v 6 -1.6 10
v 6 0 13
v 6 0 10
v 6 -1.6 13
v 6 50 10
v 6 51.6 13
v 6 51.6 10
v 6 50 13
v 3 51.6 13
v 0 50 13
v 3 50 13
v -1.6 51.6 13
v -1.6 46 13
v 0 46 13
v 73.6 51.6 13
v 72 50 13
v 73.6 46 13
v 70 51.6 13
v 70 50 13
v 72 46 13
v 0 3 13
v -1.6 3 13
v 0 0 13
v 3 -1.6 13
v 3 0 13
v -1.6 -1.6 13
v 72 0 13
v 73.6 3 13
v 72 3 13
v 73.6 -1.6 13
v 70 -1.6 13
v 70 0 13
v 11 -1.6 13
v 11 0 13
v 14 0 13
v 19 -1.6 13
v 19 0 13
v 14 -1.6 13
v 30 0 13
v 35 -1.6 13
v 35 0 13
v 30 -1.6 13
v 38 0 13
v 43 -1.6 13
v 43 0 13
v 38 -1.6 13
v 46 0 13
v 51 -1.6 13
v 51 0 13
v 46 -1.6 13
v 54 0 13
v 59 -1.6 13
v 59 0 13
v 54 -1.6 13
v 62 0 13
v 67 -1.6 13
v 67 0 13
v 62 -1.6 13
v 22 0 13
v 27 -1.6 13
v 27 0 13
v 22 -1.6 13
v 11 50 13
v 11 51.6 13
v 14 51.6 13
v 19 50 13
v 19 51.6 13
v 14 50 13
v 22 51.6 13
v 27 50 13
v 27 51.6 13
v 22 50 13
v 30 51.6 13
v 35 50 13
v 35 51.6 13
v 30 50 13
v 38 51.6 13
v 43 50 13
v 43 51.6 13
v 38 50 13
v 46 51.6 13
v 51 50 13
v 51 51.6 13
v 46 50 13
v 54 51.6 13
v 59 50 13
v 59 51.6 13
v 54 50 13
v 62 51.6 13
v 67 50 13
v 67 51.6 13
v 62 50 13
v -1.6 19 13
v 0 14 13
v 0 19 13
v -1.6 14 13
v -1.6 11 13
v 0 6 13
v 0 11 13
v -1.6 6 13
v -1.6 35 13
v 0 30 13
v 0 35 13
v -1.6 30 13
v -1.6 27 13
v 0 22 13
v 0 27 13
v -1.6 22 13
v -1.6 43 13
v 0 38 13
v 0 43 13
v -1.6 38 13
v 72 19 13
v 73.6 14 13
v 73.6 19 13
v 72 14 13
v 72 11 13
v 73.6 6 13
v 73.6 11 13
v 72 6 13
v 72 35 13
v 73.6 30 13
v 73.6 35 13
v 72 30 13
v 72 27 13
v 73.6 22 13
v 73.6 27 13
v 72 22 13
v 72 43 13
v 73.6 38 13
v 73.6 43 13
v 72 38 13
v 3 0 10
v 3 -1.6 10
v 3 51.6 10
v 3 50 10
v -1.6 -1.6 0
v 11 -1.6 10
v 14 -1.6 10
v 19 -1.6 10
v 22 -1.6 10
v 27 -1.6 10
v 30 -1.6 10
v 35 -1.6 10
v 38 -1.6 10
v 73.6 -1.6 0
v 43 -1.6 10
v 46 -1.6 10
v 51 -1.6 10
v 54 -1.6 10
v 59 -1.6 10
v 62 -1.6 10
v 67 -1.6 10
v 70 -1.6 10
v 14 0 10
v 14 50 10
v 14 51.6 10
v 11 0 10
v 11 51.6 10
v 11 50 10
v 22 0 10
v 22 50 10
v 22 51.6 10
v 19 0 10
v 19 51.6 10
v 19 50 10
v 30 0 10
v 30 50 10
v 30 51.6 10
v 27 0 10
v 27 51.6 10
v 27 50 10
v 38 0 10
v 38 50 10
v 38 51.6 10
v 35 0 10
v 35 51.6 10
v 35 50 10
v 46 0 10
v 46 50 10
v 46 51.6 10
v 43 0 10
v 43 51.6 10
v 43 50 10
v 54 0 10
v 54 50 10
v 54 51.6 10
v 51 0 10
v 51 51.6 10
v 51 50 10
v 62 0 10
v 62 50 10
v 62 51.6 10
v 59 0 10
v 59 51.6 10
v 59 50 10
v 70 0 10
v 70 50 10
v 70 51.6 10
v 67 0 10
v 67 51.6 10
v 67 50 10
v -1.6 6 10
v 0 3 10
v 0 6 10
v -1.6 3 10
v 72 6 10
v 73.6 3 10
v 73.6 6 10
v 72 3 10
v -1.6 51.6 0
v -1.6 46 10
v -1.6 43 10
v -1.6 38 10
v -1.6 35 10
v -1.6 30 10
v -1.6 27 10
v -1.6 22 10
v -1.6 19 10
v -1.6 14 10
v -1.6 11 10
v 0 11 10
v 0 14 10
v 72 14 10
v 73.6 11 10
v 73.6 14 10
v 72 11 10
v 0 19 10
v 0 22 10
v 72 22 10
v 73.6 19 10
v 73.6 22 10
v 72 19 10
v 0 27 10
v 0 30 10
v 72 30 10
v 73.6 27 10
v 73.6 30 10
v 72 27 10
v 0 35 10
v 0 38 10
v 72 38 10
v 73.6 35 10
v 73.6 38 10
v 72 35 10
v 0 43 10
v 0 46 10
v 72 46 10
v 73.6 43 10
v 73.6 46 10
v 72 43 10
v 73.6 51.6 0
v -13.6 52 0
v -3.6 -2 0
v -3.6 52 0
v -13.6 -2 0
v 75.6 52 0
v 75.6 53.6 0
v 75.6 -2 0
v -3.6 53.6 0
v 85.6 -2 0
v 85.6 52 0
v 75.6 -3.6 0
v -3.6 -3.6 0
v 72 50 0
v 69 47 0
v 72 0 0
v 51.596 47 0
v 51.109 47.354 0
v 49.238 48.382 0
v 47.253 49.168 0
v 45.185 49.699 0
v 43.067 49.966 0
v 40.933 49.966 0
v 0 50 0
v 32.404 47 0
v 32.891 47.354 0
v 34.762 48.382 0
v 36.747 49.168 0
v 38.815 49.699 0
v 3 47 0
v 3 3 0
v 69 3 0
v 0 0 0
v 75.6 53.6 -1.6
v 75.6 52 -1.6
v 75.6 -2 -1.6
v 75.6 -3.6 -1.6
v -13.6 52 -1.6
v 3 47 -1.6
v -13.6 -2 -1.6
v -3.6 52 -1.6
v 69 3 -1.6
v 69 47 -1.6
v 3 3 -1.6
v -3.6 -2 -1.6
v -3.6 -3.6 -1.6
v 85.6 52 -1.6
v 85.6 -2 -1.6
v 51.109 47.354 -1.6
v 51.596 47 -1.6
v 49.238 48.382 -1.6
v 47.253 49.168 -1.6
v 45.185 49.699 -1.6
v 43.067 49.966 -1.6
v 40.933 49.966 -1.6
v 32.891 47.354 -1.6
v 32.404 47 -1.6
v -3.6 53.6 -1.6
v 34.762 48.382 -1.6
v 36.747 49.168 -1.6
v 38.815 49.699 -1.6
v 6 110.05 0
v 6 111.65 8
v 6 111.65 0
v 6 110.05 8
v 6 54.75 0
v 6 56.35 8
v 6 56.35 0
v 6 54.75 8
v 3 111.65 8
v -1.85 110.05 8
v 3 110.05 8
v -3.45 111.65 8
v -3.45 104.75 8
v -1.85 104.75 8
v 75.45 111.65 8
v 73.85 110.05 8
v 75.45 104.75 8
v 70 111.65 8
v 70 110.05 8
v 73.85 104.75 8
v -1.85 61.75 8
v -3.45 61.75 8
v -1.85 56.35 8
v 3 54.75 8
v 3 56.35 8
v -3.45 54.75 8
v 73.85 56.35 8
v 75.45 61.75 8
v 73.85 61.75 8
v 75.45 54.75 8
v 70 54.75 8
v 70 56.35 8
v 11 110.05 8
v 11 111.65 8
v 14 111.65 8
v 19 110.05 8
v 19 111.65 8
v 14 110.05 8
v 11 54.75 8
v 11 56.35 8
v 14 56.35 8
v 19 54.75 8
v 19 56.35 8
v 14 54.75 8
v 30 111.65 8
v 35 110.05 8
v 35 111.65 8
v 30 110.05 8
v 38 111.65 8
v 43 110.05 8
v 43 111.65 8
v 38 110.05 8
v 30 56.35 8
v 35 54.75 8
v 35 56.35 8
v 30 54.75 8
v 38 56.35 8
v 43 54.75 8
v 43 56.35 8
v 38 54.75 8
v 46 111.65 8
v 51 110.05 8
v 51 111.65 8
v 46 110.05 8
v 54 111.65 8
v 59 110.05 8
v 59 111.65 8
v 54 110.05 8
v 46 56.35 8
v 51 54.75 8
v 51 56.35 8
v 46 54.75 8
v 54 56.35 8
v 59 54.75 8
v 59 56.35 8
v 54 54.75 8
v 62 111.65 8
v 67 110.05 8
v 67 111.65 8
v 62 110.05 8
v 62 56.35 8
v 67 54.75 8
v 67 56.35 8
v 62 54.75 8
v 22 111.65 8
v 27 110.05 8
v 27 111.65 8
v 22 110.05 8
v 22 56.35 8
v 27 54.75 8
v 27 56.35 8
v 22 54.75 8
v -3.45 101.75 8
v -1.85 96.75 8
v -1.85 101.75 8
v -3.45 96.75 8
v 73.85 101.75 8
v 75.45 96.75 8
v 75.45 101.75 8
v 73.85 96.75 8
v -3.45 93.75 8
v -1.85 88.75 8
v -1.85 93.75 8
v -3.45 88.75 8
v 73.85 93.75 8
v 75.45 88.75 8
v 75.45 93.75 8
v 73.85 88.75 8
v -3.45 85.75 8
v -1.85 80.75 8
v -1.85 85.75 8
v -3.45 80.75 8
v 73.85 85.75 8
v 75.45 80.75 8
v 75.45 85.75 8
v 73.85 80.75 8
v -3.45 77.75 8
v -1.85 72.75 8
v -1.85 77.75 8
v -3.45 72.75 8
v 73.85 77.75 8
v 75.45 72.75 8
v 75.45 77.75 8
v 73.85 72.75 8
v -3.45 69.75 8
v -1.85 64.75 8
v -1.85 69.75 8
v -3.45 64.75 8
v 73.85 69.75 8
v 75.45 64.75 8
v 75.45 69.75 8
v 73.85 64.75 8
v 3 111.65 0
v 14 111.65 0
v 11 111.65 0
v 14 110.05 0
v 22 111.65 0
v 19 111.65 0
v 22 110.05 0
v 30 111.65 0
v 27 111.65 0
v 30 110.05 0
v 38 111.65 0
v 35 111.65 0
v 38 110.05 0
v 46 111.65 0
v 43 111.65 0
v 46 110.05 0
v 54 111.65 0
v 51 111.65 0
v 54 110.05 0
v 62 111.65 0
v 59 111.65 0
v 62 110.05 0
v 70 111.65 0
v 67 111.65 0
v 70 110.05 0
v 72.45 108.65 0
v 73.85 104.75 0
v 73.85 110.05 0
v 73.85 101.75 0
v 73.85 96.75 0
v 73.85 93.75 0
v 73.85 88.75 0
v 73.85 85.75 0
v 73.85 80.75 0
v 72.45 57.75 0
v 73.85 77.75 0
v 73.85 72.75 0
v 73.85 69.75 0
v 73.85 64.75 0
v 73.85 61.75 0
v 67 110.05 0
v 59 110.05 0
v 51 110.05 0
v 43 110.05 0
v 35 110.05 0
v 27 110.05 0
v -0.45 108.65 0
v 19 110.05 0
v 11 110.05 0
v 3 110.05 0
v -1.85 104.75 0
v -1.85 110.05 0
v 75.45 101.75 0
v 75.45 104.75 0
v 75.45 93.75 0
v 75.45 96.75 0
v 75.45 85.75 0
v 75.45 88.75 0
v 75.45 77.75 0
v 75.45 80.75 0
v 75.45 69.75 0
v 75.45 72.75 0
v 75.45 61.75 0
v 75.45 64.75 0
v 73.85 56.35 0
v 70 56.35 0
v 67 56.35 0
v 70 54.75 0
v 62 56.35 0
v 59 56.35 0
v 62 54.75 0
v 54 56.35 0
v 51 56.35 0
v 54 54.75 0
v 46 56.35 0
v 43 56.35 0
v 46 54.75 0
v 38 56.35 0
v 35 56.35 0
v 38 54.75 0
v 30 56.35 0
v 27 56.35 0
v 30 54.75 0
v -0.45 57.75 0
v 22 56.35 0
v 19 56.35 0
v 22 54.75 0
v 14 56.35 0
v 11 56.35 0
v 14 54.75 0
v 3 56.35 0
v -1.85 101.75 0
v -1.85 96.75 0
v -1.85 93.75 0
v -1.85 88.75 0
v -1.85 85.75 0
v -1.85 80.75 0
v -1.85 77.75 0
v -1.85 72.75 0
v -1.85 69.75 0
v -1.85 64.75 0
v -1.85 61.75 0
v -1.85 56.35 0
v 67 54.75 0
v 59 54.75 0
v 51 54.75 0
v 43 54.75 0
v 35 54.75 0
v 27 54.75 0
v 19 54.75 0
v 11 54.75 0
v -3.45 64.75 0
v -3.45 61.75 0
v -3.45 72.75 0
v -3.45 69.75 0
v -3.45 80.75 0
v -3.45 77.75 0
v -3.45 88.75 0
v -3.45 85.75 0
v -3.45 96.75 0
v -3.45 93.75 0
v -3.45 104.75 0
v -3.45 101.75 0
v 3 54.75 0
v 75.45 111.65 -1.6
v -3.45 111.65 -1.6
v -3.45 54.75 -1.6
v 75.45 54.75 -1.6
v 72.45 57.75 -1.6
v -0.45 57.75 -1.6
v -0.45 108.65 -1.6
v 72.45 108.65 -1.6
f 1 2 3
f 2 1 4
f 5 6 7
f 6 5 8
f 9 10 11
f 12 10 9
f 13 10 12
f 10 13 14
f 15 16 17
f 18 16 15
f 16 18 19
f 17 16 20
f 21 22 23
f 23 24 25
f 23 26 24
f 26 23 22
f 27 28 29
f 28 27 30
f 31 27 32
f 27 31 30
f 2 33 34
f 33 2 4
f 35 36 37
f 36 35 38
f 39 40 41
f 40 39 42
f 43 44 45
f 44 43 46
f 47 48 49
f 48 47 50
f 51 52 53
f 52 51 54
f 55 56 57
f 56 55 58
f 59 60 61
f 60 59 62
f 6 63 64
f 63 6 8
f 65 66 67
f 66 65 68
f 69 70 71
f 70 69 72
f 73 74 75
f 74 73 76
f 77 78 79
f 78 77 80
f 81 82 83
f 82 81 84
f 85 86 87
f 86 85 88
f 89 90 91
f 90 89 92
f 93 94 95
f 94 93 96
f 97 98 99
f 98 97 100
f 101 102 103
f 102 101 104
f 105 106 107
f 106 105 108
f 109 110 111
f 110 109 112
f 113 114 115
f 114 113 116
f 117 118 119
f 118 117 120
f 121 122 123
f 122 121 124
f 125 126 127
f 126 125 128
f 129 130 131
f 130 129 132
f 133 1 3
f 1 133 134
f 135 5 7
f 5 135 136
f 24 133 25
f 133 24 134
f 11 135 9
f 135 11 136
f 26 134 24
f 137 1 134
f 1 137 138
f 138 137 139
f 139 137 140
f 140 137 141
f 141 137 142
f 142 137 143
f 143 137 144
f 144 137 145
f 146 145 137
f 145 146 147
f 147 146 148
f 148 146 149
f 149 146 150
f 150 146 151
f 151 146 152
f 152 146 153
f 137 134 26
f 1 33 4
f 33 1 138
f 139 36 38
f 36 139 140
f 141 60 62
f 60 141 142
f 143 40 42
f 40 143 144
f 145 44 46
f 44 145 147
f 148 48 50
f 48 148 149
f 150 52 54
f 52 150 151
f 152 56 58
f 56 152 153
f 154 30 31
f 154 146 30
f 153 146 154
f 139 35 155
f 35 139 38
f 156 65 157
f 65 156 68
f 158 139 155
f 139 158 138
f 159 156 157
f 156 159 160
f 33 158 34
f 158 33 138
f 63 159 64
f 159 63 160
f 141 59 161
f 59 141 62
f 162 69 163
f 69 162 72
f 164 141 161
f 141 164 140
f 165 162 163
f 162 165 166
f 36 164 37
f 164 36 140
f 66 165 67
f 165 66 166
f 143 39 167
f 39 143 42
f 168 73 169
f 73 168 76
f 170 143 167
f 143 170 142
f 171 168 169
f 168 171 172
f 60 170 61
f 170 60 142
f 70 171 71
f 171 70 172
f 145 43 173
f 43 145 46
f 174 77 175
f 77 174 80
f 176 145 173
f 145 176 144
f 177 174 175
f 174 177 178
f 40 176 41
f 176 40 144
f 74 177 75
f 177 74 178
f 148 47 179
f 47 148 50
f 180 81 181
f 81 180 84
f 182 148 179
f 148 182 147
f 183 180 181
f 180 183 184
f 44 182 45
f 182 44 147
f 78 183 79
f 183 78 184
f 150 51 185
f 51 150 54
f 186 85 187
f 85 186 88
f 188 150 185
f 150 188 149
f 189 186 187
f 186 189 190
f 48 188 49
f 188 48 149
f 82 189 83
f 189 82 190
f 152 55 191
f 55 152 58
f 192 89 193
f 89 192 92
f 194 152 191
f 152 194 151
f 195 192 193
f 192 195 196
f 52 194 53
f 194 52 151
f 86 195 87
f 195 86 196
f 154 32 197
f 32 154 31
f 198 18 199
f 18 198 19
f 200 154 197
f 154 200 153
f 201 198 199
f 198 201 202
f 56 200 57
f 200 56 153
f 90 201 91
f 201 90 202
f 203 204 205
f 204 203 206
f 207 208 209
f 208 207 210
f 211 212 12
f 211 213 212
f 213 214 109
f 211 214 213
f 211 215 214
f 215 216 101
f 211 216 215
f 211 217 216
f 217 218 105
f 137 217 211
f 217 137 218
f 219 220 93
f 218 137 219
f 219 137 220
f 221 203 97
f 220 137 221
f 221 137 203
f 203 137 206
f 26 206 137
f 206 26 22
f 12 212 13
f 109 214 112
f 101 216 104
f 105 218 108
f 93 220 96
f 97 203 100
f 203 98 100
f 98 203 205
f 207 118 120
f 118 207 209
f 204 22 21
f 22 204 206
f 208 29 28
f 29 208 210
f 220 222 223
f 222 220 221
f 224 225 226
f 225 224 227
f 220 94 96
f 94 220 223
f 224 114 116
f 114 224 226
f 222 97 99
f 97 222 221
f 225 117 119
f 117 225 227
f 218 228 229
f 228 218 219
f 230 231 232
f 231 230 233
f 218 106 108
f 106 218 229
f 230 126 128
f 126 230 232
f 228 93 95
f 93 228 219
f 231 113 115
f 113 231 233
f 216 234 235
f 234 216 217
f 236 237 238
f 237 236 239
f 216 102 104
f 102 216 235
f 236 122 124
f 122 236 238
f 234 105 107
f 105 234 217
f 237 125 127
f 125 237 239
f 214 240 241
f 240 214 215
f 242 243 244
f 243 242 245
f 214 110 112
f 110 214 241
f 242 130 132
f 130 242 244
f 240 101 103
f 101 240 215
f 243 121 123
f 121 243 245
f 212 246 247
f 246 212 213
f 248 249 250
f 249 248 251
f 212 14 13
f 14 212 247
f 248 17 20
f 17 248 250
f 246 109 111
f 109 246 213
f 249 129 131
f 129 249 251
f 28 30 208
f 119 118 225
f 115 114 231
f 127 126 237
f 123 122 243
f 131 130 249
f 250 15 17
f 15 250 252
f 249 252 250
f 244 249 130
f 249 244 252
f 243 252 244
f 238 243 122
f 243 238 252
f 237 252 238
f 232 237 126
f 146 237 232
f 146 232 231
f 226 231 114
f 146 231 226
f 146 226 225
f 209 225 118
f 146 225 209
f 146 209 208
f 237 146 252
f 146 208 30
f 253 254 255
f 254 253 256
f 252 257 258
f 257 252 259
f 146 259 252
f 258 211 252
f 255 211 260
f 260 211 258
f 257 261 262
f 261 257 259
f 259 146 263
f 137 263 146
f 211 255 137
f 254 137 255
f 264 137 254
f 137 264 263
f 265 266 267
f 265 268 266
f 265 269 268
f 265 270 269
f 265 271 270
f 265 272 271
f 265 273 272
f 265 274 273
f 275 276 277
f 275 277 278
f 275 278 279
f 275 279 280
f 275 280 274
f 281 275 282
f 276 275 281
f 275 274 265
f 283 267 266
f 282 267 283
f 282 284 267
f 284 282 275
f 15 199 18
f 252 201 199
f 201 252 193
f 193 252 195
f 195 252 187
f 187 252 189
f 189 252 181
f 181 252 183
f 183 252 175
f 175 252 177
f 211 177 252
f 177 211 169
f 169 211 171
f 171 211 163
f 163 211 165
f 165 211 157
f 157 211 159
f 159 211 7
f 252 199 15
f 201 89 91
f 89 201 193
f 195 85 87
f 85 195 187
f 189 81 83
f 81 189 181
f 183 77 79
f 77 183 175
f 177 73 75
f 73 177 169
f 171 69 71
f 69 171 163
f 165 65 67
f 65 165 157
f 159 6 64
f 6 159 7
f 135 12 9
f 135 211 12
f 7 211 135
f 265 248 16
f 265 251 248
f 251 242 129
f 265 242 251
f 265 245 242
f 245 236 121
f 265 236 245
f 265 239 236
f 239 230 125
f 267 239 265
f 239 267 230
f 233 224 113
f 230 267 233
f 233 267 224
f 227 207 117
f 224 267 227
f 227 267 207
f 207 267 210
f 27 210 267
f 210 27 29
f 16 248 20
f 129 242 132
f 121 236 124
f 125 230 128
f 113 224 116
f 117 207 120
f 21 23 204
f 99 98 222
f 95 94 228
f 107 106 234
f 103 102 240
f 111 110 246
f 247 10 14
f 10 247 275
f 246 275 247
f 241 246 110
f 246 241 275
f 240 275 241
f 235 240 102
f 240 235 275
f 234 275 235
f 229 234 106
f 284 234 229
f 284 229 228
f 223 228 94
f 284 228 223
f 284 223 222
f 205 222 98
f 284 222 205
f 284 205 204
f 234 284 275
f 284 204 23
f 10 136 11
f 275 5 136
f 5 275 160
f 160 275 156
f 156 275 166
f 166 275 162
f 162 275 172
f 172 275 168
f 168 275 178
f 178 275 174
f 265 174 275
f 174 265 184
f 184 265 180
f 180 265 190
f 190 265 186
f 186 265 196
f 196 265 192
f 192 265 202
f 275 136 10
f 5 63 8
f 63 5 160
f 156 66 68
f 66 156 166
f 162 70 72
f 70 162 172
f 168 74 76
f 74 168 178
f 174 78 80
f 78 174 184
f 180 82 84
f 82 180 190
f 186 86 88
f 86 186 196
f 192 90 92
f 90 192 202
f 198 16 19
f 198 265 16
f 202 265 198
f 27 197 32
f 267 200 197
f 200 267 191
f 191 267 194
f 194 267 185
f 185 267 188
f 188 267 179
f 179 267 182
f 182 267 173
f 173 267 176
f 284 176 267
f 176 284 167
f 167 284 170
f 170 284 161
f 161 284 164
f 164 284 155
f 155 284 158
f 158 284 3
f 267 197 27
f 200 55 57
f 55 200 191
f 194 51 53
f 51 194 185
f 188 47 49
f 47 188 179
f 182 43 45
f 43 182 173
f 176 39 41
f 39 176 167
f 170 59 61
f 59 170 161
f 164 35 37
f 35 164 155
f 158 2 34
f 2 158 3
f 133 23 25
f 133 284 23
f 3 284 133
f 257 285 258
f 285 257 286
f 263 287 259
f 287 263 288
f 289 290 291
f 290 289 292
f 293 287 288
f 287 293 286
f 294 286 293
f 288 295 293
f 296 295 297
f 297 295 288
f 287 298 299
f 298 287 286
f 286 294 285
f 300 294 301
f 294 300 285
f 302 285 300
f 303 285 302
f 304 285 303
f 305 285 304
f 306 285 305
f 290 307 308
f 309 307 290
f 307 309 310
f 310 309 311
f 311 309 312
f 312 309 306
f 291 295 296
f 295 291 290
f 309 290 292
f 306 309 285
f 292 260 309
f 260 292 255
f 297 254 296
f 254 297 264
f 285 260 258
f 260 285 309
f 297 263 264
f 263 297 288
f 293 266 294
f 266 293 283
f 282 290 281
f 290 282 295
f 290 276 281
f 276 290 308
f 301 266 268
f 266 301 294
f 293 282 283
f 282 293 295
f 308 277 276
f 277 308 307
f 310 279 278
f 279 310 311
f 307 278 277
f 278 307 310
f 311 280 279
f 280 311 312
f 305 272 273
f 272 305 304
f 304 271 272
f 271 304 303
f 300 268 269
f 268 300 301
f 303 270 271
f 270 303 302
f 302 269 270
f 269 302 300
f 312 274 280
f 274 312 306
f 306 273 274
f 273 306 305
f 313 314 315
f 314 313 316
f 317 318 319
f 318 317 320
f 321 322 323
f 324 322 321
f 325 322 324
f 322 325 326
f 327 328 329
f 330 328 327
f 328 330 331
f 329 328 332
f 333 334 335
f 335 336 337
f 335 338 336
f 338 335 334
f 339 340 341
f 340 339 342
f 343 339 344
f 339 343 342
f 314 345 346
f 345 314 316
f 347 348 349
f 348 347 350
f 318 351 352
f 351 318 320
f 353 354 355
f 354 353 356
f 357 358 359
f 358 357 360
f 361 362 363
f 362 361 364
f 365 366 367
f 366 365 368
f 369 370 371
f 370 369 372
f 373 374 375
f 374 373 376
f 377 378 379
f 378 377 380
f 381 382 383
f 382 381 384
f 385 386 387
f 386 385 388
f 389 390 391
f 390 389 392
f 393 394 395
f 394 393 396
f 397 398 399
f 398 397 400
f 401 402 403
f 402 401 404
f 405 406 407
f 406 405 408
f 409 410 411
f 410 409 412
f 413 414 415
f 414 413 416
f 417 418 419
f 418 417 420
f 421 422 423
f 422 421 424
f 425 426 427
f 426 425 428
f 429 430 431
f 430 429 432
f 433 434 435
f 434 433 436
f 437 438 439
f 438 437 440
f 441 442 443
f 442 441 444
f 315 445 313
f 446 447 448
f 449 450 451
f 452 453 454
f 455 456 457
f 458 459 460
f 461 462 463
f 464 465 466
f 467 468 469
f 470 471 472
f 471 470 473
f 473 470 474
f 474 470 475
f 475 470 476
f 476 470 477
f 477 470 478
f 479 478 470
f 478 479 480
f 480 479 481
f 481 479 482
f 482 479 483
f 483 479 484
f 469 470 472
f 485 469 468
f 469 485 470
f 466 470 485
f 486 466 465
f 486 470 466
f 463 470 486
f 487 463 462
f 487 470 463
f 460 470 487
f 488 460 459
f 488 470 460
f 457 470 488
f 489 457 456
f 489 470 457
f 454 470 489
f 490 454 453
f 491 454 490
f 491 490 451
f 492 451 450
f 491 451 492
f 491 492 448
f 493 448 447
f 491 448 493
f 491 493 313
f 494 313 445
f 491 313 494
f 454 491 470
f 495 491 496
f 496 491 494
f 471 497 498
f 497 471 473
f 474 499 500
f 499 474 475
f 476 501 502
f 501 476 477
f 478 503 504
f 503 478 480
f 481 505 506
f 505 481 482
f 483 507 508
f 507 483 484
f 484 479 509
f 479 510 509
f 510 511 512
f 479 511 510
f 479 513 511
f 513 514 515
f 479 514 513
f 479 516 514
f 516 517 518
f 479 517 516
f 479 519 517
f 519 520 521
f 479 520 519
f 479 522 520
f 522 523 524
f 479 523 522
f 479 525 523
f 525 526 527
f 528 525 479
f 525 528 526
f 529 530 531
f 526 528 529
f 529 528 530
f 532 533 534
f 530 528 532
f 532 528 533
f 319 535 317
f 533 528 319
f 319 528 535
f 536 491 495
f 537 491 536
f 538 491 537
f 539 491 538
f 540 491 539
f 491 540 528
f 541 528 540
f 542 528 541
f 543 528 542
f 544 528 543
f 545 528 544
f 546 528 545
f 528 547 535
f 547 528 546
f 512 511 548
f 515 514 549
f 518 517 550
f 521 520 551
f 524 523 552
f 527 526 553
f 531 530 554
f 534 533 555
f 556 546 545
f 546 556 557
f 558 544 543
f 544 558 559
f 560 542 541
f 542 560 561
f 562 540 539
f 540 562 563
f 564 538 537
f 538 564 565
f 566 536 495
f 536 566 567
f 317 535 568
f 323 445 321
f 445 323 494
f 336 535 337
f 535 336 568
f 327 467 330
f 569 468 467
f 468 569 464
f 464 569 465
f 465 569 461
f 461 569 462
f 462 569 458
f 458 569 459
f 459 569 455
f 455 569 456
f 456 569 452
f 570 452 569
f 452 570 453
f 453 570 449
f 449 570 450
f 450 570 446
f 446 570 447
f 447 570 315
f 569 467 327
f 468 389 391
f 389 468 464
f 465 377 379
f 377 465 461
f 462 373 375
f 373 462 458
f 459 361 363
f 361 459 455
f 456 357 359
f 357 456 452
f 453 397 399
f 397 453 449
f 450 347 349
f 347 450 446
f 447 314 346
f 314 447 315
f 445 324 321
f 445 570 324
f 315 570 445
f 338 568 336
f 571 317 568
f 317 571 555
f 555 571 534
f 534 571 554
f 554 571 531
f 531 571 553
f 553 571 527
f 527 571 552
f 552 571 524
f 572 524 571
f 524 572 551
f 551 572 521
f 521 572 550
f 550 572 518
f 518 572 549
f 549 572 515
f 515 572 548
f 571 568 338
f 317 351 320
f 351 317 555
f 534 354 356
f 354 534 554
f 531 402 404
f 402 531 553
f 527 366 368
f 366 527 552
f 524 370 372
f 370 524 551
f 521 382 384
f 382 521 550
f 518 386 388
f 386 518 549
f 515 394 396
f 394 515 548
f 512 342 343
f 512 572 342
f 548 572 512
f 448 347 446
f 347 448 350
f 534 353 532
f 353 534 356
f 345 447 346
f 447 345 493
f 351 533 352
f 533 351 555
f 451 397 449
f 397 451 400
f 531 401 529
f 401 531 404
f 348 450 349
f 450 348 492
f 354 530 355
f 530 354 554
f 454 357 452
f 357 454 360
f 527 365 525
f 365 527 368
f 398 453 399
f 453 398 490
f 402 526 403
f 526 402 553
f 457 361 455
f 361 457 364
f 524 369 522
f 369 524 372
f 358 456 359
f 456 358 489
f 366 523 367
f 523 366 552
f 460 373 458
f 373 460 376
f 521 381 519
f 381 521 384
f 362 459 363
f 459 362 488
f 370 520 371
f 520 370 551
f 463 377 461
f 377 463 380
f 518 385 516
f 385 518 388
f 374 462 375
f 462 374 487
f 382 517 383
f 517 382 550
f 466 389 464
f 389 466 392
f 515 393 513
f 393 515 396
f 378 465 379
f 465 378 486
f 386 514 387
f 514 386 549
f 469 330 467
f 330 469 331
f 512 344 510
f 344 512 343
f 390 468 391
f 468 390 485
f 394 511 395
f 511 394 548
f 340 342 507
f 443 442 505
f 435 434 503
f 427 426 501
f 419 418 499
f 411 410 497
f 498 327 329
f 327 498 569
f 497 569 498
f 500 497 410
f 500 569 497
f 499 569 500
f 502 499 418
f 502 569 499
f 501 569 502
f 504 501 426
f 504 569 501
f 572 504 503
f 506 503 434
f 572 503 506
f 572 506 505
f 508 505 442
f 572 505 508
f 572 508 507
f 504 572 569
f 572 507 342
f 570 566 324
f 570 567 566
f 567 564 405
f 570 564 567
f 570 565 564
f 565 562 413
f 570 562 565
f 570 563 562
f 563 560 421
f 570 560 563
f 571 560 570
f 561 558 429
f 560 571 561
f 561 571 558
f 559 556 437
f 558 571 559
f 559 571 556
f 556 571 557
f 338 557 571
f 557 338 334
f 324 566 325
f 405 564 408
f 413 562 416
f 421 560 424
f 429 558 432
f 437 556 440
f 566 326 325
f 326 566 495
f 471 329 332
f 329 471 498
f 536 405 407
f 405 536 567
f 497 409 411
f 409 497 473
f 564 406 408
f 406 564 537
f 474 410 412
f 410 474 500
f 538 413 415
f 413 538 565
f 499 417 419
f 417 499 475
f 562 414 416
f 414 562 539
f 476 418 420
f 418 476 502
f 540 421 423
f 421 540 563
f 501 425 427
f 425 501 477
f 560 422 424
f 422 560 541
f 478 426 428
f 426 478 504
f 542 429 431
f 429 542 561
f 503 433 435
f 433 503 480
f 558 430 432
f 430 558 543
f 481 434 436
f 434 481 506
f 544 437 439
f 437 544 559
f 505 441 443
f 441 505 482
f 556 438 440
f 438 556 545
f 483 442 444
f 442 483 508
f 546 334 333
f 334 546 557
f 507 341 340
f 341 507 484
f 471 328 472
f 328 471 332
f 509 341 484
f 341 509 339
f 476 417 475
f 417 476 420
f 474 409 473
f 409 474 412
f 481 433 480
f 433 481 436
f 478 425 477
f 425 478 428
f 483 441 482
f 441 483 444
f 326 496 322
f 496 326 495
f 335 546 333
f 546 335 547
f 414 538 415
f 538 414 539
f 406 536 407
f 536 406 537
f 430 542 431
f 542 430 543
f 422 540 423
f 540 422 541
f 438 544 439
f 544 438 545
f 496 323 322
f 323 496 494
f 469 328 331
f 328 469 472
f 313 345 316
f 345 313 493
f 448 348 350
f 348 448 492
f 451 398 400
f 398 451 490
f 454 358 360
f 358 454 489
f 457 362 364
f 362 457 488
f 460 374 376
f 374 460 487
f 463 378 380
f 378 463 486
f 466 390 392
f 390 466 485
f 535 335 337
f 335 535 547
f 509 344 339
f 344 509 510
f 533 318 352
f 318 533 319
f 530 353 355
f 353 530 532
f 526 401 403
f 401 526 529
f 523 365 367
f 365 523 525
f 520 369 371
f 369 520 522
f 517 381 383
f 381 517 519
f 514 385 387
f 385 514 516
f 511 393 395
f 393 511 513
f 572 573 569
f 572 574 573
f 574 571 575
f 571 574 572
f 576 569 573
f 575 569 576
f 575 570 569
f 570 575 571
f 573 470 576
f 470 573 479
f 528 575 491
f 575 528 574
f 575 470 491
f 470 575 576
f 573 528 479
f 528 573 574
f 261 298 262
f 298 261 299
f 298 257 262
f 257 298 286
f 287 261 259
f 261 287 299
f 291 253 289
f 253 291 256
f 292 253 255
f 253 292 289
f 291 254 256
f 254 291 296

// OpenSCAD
//design and code by bioprint (http://www.thingiverse.com/bioprint)
//This code generates a holder for Microfluidics Chamber (customizable)
// 2015-01-16:	first design



// Size of nozzle
SizeOfNozzle = 0.4; // size of nozzle
// Endholder Width
EndholderWidth = 54; // 54 mm for Nikon Ti holder
// Endholder Lip
EndholderLip = 10; // 3 mm

// Objective Diameter
ObjectiveDiameter = 34; // 34 mm
// Objective Center X
ObjectiveCenterX = 42; // 42 mm
// Objective Center Y
ObjectiveCenterY = 33; // 33 mm
// Objective Rim
ObjectiveRim = 3; // 3 mm

// Bottom thickness measured in layers
BottomThicknessInLayers = 4; // number of layers
// Wall thickness measured in layers
WallThicknessInLayers = 4; // number of layers
// Inner Skirt Width
InnerSkirtWidth = 3; // 3 mm

// Outer Skirt Width
OuterSkirtWidth = 2; // 2 mm

// Wall Height
WallHeight = 13; // 10 mm
// NotchSize
NotchSize = 3; // 3 mm
// Inner Width
InnerWidth = 50; // 50 mm
// Inner Length
InnerLength = 72; // 72 mm


// NotchDistance
NotchDistance = 8; // 8 mm

// LidTolerance
LidTolerance = 0.5; // 1 mm
// Lid Height
LidHeight = 8; // 8 mm


WallThicknessInMM = WallThicknessInLayers*SizeOfNozzle;

//OuterSkirtWidth = MaximumWidth - 2*WallThicknessInMM - InnerWidth;

BottomThicknessInLayersInMM = BottomThicknessInLayers*SizeOfNozzle;
// this arrangement barely fits the 150 mm build table
// LidXOffset = InnerLength + 2*WallThicknessInMM + OuterSkirtWidth + InnerSkirtWidth; 

LidXOffset = 0;
LidYOffset = InnerWidth + 2*WallThicknessInMM + OuterSkirtWidth + InnerSkirtWidth; 

// cylinder(h = 10, r=20, $fn=50);



// bottom layer
difference(){
	translate([-1*WallThicknessInMM,-1*WallThicknessInMM,0]) 
		cube(size = [InnerLength + WallThicknessInMM * 2,
						InnerWidth + WallThicknessInMM * 2,
						WallHeight], center = false);
	translate([0,0,0]) 
		cube(size = [InnerLength,
						InnerWidth,
						WallHeight], center = false);
	// notches
//	for ( c = [NotchDistance/2 : NotchDistance : InnerLength - NotchDistance/2] )
//	{
//		translate([c,
//						-1*WallThicknessInMM,
//						0]) 
//		cube(size = [NotchDistance/2,
//						WallThicknessInMM+2,
//						WallHeight], center = false);
//
//	}

	for ( c = [NotchSize : NotchDistance : InnerLength-NotchSize] )
	{
		translate([c,
						-1*WallThicknessInMM,
						WallHeight-NotchSize]) 
		cube(size = [NotchSize,
						 InnerWidth+3*WallThicknessInMM,
						 NotchSize], center = false);

	}

	for ( c = [NotchSize : NotchDistance : InnerWidth-NotchSize] )
	{
		translate([-1*WallThicknessInMM,
						c,
						WallHeight-NotchSize]) 
		cube(size = [InnerLength+3*WallThicknessInMM,
							NotchSize,
						 	NotchSize], center = false);

	}
// cut cylinder
	translate([ObjectiveCenterX, ObjectiveCenterY, -1*BottomThicknessInLayersInMM])
		cylinder(h = BottomThicknessInLayersInMM + WallHeight, r=ObjectiveDiameter/2, $fn=10);

}

// skirts
//BottomThicknessInLayersInMM  InnerSkirtWidth OuterSkirtWidth
difference(){
	translate([-1*WallThicknessInMM-OuterSkirtWidth,
					-1*WallThicknessInMM-OuterSkirtWidth,
					-1*BottomThicknessInLayersInMM]) 
		cube(size = [InnerLength + (WallThicknessInMM+OuterSkirtWidth) * 2,
						InnerWidth + (WallThicknessInMM+OuterSkirtWidth) * 2,
						BottomThicknessInLayersInMM], center = false);

	translate([	0,
				  	0,
					-1*BottomThicknessInLayersInMM]) 
		cube(size = [InnerLength,
						InnerWidth,
						BottomThicknessInLayersInMM], center = false);


// cut cylinder
	translate([ObjectiveCenterX, ObjectiveCenterY, -1*BottomThicknessInLayersInMM])
		cylinder(h = BottomThicknessInLayersInMM + WallHeight, r=ObjectiveDiameter/2, $fn=10);

}

// end holders
	// holders on sides (Nikon C2)

//EndholderWidth = 54; // 54 mm for Nikon Ti holder
// Endholder Lip
//EndholderLip = 10; // 3 mm

	translate([-1*WallThicknessInMM-OuterSkirtWidth + InnerLength + (WallThicknessInMM+OuterSkirtWidth) * 2,
					-1*WallThicknessInMM-OuterSkirtWidth + (InnerWidth + (WallThicknessInMM+OuterSkirtWidth) * 2)/2 - EndholderWidth/2,
					-1*BottomThicknessInLayersInMM]) 
		cube(size = [EndholderLip,
						 EndholderWidth,
						 BottomThicknessInLayersInMM], center = false);


	translate([-1*WallThicknessInMM-OuterSkirtWidth - EndholderLip,
					-1*WallThicknessInMM-OuterSkirtWidth + (InnerWidth + (WallThicknessInMM+OuterSkirtWidth) * 2)/2 - EndholderWidth/2,
					-1*BottomThicknessInLayersInMM]) 
		cube(size = [EndholderLip,
						 EndholderWidth,
						 BottomThicknessInLayersInMM], center = false);

// inner lip

difference(){
	translate([-1*WallThicknessInMM,
					-1*WallThicknessInMM,
					-1*BottomThicknessInLayersInMM]) 
		cube(size = [InnerLength + (WallThicknessInMM) * 2,
						InnerWidth + (WallThicknessInMM) * 2,
						BottomThicknessInLayersInMM], center = false);

	translate([	InnerSkirtWidth,
				  	InnerSkirtWidth,
					-1*BottomThicknessInLayersInMM]) 
		cube(size = [InnerLength-2*InnerSkirtWidth,
						InnerWidth-2*InnerSkirtWidth,
						BottomThicknessInLayersInMM], center = false);

// cut cylinder
	translate([ObjectiveCenterX, ObjectiveCenterY, -1*BottomThicknessInLayersInMM])
		cylinder(h = BottomThicknessInLayersInMM + WallHeight, r=ObjectiveDiameter/2, $fn=50);

}




// Lid
// LidXOffset LidTolerance LidHeight


difference(){
	translate([LidXOffset-2*WallThicknessInMM -LidTolerance/2 , 
				  LidYOffset -2*WallThicknessInMM -LidTolerance/2,0]) 
		cube(size = [InnerLength + WallThicknessInMM * 4 + LidTolerance,
						InnerWidth + WallThicknessInMM * 4 + LidTolerance,
						LidHeight], center = false);
	translate([LidXOffset-WallThicknessInMM -LidTolerance/2 ,
				  LidYOffset-WallThicknessInMM -LidTolerance/2,0]) 
		cube(size = [InnerLength + LidTolerance + 2*WallThicknessInMM,
						InnerWidth + LidTolerance + 2*WallThicknessInMM,
						LidHeight], center = false);

	for ( c = [NotchSize : NotchDistance : InnerLength-NotchSize] )
	{
		translate([c + LidXOffset,
						LidYOffset -2*WallThicknessInMM -LidTolerance/2,
						0])  //LidHeight-NotchSize]
		cube(size = [NotchSize,
						 InnerWidth+4*WallThicknessInMM+LidTolerance,
						 LidHeight], center = false); //NotchSize

	}

	// has to be symmetric
	for ( c = [InnerWidth- NotchSize - 2*WallThicknessInMM - LidTolerance/2  : -1*NotchDistance : NotchSize] )
	{
		translate([-2*WallThicknessInMM-LidTolerance/2 + LidXOffset,
						c + LidYOffset,
						0]) //
		cube(size = [InnerLength+4*WallThicknessInMM+LidTolerance,
							NotchSize,
						 	LidHeight], center = false);

	}


}




difference(){

	translate([LidXOffset-2*WallThicknessInMM -LidTolerance/2 ,
					LidYOffset-2*WallThicknessInMM -LidTolerance/2,
					-1*BottomThicknessInLayersInMM]) 
		cube(size = [InnerLength + WallThicknessInMM * 4 + LidTolerance,
						InnerWidth + WallThicknessInMM * 4 + LidTolerance,
						BottomThicknessInLayersInMM], center = false);


	translate([LidXOffset-2*WallThicknessInMM -LidTolerance/2 + InnerSkirtWidth ,
					LidYOffset-2*WallThicknessInMM -LidTolerance/2 + InnerSkirtWidth,
					-1*BottomThicknessInLayersInMM]) 
		cube(size = [InnerLength + WallThicknessInMM * 4 + LidTolerance - 2*InnerSkirtWidth,
						InnerWidth + WallThicknessInMM * 4 + LidTolerance - 2* InnerSkirtWidth,
						BottomThicknessInLayersInMM], center = false);
}
